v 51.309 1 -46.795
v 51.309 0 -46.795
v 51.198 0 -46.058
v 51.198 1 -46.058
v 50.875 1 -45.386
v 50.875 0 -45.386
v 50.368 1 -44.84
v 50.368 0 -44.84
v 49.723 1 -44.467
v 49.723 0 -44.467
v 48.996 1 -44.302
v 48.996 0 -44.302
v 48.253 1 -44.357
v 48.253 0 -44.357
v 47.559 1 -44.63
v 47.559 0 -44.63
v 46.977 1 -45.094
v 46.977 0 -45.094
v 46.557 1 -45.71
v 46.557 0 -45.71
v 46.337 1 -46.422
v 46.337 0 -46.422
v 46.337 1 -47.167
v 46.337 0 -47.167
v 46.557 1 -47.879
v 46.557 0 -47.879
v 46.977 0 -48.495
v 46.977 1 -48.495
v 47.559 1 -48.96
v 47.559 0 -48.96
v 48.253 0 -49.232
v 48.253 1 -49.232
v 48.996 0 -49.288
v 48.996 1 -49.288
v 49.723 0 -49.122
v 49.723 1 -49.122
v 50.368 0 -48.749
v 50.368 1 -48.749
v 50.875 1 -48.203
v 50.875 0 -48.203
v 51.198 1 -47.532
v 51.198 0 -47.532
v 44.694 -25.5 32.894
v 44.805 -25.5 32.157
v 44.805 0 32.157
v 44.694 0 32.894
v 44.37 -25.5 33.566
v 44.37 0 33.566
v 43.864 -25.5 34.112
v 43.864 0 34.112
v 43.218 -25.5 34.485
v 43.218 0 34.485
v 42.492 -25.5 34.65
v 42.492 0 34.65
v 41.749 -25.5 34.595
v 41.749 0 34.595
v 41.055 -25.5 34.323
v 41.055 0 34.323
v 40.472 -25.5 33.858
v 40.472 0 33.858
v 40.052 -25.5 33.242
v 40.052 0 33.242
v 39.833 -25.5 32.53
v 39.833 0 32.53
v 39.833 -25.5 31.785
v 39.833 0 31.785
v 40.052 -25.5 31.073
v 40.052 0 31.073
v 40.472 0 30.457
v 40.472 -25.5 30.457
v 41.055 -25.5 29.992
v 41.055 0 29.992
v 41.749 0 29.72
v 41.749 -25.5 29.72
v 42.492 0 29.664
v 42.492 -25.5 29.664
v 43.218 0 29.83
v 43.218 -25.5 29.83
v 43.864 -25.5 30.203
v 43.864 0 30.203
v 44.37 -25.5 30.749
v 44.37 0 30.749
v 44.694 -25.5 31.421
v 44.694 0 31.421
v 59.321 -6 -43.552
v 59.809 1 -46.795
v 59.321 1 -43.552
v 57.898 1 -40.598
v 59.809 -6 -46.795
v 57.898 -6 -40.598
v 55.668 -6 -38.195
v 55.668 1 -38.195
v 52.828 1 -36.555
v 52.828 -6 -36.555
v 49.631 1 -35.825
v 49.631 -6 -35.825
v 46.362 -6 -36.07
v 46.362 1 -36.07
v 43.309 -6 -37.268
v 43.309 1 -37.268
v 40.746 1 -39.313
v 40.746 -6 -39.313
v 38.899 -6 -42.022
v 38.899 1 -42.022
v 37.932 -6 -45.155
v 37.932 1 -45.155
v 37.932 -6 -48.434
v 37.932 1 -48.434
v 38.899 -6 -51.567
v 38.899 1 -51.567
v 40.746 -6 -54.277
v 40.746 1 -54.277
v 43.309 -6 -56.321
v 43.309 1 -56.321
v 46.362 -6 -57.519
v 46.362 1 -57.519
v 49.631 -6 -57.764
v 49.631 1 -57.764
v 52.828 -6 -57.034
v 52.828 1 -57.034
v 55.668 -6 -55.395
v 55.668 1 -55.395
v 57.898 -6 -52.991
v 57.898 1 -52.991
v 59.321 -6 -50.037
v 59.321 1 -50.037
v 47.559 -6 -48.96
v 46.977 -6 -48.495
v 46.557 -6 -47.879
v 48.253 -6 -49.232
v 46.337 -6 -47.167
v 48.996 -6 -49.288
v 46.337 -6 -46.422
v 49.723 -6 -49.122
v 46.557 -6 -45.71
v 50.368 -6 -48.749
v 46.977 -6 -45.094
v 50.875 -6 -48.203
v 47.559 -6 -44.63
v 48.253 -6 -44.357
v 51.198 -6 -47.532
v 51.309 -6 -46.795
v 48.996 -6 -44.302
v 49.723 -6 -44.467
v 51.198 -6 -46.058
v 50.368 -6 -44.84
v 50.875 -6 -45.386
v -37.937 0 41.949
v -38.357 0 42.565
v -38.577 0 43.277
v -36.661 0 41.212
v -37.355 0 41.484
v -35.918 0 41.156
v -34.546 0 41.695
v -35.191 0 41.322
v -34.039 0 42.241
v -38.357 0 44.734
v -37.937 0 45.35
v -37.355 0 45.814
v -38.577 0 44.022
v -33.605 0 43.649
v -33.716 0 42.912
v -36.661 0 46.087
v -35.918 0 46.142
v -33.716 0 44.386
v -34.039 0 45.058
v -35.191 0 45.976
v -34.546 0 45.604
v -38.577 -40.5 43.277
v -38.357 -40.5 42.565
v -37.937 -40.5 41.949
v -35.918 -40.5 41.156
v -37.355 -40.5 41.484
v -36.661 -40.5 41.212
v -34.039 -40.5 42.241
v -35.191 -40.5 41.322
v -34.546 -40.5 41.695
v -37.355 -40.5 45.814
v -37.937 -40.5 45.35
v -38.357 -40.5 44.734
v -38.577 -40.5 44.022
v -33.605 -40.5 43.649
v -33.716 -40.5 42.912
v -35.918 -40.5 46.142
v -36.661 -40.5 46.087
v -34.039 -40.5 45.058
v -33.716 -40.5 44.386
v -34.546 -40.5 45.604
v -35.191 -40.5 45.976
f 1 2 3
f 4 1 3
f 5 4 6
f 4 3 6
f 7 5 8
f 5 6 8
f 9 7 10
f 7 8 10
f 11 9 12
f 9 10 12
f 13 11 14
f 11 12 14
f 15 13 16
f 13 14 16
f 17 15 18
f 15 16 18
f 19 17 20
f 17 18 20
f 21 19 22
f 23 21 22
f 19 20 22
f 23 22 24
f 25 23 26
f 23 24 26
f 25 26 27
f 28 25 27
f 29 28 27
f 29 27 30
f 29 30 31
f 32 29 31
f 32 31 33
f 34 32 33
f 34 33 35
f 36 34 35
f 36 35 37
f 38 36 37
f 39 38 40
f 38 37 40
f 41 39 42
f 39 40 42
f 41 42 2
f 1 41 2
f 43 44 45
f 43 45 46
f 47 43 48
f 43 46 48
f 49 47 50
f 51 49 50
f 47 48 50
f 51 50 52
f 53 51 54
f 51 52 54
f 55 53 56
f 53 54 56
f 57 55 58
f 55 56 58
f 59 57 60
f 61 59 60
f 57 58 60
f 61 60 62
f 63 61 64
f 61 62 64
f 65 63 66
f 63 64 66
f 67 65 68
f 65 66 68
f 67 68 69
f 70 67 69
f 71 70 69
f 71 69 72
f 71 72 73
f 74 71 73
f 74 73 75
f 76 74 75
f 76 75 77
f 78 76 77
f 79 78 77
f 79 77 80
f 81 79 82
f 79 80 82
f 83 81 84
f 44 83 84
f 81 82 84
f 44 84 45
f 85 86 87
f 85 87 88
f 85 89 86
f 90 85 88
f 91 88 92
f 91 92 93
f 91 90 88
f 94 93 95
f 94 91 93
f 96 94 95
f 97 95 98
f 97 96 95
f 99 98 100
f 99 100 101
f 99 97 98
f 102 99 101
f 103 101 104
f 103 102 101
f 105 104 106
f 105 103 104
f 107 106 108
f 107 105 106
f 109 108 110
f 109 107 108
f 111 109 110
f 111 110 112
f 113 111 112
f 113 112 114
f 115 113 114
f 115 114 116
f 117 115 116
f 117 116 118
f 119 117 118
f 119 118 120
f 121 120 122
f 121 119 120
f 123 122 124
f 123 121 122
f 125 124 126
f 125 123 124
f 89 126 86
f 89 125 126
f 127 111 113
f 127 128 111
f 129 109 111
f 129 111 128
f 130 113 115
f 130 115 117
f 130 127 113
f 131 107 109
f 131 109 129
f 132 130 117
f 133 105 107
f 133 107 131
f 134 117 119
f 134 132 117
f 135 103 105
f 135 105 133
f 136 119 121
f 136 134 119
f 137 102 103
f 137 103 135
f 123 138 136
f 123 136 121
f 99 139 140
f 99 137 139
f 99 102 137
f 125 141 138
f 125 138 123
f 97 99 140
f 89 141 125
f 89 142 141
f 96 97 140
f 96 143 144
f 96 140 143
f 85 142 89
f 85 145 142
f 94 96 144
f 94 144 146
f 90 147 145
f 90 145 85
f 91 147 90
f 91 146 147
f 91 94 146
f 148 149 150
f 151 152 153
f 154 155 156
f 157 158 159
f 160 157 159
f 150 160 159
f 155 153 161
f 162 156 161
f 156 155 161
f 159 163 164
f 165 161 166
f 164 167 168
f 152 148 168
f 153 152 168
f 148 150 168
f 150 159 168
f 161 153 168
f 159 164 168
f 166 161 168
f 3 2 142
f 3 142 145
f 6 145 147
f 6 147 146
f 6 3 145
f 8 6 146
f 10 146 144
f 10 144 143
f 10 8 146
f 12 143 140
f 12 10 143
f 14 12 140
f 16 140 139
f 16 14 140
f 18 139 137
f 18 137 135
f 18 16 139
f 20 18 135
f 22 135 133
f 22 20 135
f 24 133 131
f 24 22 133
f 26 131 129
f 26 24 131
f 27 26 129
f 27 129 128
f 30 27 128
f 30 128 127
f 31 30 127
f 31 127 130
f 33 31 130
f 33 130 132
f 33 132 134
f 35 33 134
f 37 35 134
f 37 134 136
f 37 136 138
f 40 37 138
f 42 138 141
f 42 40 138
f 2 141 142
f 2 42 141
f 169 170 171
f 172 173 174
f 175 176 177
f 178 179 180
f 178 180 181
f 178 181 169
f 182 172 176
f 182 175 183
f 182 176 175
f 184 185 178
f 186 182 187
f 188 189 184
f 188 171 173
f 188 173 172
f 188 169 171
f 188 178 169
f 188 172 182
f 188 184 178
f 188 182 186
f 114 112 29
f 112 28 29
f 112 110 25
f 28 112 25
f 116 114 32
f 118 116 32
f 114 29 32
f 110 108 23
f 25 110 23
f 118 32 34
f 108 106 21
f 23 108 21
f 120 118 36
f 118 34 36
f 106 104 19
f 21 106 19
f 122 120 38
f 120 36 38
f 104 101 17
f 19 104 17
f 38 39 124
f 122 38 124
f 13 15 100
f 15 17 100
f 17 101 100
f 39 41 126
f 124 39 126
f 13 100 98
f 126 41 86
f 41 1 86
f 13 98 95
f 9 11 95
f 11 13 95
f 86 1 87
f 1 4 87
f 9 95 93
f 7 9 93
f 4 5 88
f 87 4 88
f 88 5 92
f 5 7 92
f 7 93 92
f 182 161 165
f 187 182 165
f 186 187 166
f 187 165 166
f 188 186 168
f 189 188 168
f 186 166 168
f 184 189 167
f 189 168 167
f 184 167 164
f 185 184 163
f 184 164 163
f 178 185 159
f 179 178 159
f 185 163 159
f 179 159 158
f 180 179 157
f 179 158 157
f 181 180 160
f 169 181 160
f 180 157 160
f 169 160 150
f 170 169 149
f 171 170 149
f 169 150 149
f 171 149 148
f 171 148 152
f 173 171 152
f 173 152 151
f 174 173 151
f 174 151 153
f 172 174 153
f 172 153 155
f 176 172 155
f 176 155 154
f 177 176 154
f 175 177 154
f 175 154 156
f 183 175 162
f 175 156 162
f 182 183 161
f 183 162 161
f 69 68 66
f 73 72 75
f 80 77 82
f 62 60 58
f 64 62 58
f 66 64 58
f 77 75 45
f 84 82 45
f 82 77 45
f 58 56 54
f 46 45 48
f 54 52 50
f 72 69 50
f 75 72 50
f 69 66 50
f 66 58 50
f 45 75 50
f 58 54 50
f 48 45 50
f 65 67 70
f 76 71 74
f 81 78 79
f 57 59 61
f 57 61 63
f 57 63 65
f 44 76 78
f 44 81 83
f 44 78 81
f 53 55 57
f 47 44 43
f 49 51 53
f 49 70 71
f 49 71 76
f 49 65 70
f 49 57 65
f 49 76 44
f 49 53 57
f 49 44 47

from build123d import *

# Parameters (mm, degrees)
F0_R          = 11
F0_R_2        = 2.5
F1_DEPTH      = 6
F1_DEPTH_BACK = 1
F2_R          = 2.5
F3_DEPTH      = 25.5
F4_R          = 2.5
F5_DEPTH      = 40.5


with BuildPart() as f1:
    # F0 (on Front) → F1 (new body, two sides)
    with BuildSketch(Plane.XZ) as f1_sk:
        with Locations((48.809282, -46.794683)):
            Circle(F0_R)
        with Locations((48.809282, -46.794683)):
            Circle(F0_R_2, mode=Mode.SUBTRACT)
    extrude(amount=F1_DEPTH)
    extrude(f1_sk.sketch, amount=-F1_DEPTH_BACK)


with BuildPart() as f3:
    # F2 (on Front) → F3 (new body)
    with BuildSketch(Plane.XZ):
        with Locations((42.304903, 32.157443)):
            Circle(F2_R)
    extrude(amount=F3_DEPTH)


with BuildPart() as f5:
    # F4 (on Front) → F5 (new body)
    with BuildSketch(Plane.XZ):
        with Locations((-36.104668, 43.649253)):
            Circle(F4_R)
    extrude(amount=F5_DEPTH)


solid = Compound([f1.part, f3.part, f5.part])
